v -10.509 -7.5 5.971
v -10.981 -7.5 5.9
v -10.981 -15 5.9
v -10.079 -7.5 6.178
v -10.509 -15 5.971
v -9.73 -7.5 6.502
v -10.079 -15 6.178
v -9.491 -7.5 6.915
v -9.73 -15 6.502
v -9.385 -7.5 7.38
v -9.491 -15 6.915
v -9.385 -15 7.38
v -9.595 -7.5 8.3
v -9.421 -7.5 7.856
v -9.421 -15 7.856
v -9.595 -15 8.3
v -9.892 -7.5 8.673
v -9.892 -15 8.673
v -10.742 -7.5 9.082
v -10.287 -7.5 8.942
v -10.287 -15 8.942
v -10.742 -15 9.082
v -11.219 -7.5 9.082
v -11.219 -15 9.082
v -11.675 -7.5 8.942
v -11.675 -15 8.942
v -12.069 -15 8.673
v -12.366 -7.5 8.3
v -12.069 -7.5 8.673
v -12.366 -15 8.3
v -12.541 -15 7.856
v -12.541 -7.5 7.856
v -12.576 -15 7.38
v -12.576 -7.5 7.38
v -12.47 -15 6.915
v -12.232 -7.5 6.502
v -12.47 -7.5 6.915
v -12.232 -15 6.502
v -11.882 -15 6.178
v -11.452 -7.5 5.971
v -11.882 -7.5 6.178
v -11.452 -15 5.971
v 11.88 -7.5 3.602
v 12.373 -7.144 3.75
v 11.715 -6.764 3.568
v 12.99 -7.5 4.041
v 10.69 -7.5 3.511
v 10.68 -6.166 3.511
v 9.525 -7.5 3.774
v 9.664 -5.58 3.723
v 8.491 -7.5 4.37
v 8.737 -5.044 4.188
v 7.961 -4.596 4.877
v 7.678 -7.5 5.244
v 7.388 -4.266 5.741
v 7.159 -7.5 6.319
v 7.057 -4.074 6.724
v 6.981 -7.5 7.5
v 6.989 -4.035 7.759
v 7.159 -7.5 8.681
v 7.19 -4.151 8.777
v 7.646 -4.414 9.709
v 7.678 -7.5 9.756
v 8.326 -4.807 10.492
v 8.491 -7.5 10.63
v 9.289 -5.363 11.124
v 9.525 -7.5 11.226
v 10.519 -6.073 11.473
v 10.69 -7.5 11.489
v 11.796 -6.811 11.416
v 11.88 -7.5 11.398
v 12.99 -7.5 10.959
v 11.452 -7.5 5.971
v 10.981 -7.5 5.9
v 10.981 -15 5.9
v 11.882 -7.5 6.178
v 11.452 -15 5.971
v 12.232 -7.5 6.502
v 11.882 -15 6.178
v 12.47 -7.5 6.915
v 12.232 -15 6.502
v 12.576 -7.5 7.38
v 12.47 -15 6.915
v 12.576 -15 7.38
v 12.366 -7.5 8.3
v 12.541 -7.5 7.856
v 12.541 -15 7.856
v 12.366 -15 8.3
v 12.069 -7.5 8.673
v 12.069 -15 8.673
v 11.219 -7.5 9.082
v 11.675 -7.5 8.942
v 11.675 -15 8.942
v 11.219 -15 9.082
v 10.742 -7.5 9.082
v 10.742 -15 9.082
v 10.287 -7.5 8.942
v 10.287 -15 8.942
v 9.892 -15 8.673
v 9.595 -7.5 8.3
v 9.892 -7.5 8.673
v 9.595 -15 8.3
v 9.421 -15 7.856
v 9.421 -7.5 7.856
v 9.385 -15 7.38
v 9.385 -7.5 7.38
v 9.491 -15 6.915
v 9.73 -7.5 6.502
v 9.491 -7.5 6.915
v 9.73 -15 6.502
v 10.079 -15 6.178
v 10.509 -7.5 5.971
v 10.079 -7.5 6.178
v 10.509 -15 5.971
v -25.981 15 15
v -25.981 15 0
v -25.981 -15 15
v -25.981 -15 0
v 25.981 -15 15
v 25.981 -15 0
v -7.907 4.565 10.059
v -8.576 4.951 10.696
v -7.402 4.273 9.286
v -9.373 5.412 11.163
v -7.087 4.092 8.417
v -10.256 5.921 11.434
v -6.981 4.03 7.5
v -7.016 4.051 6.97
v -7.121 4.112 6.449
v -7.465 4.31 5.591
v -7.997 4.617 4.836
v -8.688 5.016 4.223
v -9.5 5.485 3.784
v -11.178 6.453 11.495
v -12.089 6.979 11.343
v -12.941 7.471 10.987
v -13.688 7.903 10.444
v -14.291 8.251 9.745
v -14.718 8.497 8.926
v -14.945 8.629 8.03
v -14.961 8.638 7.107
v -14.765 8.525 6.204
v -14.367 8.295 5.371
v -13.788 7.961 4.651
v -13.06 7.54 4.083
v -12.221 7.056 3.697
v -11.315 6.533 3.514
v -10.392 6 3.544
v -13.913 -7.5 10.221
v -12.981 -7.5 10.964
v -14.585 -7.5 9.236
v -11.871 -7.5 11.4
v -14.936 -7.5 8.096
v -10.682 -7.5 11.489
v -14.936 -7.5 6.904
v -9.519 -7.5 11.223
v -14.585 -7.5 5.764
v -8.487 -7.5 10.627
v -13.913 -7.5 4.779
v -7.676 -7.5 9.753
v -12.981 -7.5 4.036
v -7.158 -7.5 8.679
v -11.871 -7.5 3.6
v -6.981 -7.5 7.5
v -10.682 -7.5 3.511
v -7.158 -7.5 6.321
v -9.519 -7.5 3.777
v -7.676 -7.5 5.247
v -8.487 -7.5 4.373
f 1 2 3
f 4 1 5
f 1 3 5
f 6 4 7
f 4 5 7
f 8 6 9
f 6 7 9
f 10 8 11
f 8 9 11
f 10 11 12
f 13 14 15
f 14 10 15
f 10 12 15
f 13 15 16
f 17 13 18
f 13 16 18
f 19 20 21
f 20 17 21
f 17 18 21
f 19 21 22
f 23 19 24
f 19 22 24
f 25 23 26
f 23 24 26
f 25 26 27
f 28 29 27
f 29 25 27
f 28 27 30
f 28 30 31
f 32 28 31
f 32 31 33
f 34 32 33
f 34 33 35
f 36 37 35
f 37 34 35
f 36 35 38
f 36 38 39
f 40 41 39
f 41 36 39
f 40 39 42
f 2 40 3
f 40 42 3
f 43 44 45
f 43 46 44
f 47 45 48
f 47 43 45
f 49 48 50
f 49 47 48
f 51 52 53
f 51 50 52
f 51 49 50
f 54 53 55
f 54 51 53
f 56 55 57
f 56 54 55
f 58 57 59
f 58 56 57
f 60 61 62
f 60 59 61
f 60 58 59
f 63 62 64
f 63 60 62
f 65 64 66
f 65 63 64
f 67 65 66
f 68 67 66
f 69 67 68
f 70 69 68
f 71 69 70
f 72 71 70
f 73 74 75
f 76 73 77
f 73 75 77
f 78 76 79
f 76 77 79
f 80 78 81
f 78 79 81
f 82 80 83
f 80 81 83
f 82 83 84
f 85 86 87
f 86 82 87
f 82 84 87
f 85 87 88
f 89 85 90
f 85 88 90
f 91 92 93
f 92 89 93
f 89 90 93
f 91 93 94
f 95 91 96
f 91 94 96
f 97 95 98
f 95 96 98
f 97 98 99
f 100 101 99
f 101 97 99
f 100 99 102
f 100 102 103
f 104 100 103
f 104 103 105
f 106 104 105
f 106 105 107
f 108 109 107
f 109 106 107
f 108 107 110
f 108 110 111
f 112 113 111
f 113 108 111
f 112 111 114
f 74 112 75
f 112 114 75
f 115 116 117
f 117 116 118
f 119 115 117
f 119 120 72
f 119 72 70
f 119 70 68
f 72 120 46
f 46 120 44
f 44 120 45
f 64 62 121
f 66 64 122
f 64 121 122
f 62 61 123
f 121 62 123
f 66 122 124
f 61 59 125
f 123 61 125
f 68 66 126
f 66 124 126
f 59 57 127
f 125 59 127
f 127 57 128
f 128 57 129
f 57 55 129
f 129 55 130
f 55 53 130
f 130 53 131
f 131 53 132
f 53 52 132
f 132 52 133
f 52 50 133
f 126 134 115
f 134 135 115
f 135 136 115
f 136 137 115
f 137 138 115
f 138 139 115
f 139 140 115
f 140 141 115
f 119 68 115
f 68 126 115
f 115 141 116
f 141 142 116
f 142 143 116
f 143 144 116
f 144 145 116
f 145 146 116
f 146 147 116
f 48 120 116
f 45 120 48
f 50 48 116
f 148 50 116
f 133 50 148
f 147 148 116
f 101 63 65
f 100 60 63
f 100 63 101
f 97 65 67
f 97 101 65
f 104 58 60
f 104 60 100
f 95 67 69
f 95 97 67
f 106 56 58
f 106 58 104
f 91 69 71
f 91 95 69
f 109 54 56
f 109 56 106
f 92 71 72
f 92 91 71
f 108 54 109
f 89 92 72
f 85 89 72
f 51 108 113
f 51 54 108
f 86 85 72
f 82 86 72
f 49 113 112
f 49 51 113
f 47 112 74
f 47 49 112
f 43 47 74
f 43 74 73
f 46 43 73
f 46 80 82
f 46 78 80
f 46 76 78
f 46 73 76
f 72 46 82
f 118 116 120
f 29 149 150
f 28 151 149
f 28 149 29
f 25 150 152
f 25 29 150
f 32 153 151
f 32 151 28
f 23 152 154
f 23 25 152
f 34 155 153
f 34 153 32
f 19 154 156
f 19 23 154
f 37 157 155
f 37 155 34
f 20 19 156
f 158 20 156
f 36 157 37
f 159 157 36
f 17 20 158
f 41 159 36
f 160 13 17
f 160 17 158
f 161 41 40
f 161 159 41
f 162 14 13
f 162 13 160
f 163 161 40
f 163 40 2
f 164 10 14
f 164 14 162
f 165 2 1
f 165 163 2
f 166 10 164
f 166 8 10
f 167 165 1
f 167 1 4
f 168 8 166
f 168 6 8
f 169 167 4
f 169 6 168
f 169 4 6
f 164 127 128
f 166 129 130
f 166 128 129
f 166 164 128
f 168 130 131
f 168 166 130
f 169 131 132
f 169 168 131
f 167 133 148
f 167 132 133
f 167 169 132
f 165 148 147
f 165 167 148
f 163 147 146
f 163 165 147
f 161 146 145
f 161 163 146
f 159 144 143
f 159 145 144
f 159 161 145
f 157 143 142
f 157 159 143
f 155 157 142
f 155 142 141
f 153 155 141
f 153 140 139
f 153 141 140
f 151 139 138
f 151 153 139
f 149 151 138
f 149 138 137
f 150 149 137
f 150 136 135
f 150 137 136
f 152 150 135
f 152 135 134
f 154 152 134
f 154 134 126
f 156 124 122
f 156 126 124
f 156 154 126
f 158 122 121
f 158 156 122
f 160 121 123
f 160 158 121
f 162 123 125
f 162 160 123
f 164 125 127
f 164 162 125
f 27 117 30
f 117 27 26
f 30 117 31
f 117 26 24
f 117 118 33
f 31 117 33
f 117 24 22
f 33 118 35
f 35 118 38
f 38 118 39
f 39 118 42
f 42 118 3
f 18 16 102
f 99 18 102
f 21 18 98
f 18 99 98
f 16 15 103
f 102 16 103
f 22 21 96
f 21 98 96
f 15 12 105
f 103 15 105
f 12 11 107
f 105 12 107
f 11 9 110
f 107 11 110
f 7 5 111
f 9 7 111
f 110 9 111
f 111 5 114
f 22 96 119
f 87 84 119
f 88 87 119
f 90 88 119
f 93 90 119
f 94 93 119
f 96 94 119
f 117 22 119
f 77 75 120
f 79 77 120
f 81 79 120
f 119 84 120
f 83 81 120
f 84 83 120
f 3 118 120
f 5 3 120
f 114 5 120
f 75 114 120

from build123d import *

# Parameters (mm, degrees)
EXTRUDE_1_DEPTH          = 15
SKETCH_2_R               = 1.6
CUT_EXTRUDE_1_DEPTH      = 43.426406871
CUT_EXTRUDE_2_DEPTH      = 34.541019662
CUT_EXTRUDE_2_DEPTH_BACK = 7.5
SKETCH_3_R               = 4
SKETCH_3_R_2             = 1.6


with BuildPart() as part:
    # ｽｹｯﾁ1 → ﾎﾞｽ - 押し出し1 (new body)
    with BuildSketch(Plane.XY):
        Polygon((-25.980762114, 15), (-25.980762114, -15), (25.980762114, -15), align=None)
    extrude(amount=EXTRUDE_1_DEPTH)

    # ｽｹｯﾁ2 → ｶｯﾄ - 押し出し1 (cut, through all)
    with BuildSketch(Plane.XZ.offset(15)):
        with Locations(Location((-10.980762114, 7.5, 0), (0, 0, 270))):
            Circle(SKETCH_2_R)
        with Locations(Location((10.980762114, 7.5, 0), (0, 0, 270))):
            Circle(SKETCH_2_R)
    extrude(amount=-CUT_EXTRUDE_1_DEPTH, mode=Mode.SUBTRACT)

    # ｽｹｯﾁ3 → ｶｯﾄ - 押し出し2 (cut, two sides: drawn at the far end of the back side and taken through both)
    # profile 1 of 2: a face of its own
    with BuildSketch(Plane(origin=(0, 0, 0), x_dir=(1, 0, 0), z_dir=(0, 1, 0)).offset(-CUT_EXTRUDE_2_DEPTH_BACK)):
        with Locations((-10.980762114, -7.5)):
            Circle(SKETCH_3_R)
        with Locations(Location((-10.980762114, -7.5, 0), (0, 0, 90))):
            Circle(SKETCH_3_R_2, mode=Mode.SUBTRACT)
    # profile 2 of 2: a face of its own
    with BuildSketch(Plane(origin=(0, 0, 0), x_dir=(1, 0, 0), z_dir=(0, 1, 0)).offset(-CUT_EXTRUDE_2_DEPTH_BACK)):
        with Locations((10.980762114, -7.5)):
            Circle(SKETCH_3_R)
        with Locations(Location((10.980762114, -7.5, 0), (0, 0, 90))):
            Circle(SKETCH_3_R_2, mode=Mode.SUBTRACT)
    extrude(amount=CUT_EXTRUDE_2_DEPTH + CUT_EXTRUDE_2_DEPTH_BACK, mode=Mode.SUBTRACT)


solid = part.part
